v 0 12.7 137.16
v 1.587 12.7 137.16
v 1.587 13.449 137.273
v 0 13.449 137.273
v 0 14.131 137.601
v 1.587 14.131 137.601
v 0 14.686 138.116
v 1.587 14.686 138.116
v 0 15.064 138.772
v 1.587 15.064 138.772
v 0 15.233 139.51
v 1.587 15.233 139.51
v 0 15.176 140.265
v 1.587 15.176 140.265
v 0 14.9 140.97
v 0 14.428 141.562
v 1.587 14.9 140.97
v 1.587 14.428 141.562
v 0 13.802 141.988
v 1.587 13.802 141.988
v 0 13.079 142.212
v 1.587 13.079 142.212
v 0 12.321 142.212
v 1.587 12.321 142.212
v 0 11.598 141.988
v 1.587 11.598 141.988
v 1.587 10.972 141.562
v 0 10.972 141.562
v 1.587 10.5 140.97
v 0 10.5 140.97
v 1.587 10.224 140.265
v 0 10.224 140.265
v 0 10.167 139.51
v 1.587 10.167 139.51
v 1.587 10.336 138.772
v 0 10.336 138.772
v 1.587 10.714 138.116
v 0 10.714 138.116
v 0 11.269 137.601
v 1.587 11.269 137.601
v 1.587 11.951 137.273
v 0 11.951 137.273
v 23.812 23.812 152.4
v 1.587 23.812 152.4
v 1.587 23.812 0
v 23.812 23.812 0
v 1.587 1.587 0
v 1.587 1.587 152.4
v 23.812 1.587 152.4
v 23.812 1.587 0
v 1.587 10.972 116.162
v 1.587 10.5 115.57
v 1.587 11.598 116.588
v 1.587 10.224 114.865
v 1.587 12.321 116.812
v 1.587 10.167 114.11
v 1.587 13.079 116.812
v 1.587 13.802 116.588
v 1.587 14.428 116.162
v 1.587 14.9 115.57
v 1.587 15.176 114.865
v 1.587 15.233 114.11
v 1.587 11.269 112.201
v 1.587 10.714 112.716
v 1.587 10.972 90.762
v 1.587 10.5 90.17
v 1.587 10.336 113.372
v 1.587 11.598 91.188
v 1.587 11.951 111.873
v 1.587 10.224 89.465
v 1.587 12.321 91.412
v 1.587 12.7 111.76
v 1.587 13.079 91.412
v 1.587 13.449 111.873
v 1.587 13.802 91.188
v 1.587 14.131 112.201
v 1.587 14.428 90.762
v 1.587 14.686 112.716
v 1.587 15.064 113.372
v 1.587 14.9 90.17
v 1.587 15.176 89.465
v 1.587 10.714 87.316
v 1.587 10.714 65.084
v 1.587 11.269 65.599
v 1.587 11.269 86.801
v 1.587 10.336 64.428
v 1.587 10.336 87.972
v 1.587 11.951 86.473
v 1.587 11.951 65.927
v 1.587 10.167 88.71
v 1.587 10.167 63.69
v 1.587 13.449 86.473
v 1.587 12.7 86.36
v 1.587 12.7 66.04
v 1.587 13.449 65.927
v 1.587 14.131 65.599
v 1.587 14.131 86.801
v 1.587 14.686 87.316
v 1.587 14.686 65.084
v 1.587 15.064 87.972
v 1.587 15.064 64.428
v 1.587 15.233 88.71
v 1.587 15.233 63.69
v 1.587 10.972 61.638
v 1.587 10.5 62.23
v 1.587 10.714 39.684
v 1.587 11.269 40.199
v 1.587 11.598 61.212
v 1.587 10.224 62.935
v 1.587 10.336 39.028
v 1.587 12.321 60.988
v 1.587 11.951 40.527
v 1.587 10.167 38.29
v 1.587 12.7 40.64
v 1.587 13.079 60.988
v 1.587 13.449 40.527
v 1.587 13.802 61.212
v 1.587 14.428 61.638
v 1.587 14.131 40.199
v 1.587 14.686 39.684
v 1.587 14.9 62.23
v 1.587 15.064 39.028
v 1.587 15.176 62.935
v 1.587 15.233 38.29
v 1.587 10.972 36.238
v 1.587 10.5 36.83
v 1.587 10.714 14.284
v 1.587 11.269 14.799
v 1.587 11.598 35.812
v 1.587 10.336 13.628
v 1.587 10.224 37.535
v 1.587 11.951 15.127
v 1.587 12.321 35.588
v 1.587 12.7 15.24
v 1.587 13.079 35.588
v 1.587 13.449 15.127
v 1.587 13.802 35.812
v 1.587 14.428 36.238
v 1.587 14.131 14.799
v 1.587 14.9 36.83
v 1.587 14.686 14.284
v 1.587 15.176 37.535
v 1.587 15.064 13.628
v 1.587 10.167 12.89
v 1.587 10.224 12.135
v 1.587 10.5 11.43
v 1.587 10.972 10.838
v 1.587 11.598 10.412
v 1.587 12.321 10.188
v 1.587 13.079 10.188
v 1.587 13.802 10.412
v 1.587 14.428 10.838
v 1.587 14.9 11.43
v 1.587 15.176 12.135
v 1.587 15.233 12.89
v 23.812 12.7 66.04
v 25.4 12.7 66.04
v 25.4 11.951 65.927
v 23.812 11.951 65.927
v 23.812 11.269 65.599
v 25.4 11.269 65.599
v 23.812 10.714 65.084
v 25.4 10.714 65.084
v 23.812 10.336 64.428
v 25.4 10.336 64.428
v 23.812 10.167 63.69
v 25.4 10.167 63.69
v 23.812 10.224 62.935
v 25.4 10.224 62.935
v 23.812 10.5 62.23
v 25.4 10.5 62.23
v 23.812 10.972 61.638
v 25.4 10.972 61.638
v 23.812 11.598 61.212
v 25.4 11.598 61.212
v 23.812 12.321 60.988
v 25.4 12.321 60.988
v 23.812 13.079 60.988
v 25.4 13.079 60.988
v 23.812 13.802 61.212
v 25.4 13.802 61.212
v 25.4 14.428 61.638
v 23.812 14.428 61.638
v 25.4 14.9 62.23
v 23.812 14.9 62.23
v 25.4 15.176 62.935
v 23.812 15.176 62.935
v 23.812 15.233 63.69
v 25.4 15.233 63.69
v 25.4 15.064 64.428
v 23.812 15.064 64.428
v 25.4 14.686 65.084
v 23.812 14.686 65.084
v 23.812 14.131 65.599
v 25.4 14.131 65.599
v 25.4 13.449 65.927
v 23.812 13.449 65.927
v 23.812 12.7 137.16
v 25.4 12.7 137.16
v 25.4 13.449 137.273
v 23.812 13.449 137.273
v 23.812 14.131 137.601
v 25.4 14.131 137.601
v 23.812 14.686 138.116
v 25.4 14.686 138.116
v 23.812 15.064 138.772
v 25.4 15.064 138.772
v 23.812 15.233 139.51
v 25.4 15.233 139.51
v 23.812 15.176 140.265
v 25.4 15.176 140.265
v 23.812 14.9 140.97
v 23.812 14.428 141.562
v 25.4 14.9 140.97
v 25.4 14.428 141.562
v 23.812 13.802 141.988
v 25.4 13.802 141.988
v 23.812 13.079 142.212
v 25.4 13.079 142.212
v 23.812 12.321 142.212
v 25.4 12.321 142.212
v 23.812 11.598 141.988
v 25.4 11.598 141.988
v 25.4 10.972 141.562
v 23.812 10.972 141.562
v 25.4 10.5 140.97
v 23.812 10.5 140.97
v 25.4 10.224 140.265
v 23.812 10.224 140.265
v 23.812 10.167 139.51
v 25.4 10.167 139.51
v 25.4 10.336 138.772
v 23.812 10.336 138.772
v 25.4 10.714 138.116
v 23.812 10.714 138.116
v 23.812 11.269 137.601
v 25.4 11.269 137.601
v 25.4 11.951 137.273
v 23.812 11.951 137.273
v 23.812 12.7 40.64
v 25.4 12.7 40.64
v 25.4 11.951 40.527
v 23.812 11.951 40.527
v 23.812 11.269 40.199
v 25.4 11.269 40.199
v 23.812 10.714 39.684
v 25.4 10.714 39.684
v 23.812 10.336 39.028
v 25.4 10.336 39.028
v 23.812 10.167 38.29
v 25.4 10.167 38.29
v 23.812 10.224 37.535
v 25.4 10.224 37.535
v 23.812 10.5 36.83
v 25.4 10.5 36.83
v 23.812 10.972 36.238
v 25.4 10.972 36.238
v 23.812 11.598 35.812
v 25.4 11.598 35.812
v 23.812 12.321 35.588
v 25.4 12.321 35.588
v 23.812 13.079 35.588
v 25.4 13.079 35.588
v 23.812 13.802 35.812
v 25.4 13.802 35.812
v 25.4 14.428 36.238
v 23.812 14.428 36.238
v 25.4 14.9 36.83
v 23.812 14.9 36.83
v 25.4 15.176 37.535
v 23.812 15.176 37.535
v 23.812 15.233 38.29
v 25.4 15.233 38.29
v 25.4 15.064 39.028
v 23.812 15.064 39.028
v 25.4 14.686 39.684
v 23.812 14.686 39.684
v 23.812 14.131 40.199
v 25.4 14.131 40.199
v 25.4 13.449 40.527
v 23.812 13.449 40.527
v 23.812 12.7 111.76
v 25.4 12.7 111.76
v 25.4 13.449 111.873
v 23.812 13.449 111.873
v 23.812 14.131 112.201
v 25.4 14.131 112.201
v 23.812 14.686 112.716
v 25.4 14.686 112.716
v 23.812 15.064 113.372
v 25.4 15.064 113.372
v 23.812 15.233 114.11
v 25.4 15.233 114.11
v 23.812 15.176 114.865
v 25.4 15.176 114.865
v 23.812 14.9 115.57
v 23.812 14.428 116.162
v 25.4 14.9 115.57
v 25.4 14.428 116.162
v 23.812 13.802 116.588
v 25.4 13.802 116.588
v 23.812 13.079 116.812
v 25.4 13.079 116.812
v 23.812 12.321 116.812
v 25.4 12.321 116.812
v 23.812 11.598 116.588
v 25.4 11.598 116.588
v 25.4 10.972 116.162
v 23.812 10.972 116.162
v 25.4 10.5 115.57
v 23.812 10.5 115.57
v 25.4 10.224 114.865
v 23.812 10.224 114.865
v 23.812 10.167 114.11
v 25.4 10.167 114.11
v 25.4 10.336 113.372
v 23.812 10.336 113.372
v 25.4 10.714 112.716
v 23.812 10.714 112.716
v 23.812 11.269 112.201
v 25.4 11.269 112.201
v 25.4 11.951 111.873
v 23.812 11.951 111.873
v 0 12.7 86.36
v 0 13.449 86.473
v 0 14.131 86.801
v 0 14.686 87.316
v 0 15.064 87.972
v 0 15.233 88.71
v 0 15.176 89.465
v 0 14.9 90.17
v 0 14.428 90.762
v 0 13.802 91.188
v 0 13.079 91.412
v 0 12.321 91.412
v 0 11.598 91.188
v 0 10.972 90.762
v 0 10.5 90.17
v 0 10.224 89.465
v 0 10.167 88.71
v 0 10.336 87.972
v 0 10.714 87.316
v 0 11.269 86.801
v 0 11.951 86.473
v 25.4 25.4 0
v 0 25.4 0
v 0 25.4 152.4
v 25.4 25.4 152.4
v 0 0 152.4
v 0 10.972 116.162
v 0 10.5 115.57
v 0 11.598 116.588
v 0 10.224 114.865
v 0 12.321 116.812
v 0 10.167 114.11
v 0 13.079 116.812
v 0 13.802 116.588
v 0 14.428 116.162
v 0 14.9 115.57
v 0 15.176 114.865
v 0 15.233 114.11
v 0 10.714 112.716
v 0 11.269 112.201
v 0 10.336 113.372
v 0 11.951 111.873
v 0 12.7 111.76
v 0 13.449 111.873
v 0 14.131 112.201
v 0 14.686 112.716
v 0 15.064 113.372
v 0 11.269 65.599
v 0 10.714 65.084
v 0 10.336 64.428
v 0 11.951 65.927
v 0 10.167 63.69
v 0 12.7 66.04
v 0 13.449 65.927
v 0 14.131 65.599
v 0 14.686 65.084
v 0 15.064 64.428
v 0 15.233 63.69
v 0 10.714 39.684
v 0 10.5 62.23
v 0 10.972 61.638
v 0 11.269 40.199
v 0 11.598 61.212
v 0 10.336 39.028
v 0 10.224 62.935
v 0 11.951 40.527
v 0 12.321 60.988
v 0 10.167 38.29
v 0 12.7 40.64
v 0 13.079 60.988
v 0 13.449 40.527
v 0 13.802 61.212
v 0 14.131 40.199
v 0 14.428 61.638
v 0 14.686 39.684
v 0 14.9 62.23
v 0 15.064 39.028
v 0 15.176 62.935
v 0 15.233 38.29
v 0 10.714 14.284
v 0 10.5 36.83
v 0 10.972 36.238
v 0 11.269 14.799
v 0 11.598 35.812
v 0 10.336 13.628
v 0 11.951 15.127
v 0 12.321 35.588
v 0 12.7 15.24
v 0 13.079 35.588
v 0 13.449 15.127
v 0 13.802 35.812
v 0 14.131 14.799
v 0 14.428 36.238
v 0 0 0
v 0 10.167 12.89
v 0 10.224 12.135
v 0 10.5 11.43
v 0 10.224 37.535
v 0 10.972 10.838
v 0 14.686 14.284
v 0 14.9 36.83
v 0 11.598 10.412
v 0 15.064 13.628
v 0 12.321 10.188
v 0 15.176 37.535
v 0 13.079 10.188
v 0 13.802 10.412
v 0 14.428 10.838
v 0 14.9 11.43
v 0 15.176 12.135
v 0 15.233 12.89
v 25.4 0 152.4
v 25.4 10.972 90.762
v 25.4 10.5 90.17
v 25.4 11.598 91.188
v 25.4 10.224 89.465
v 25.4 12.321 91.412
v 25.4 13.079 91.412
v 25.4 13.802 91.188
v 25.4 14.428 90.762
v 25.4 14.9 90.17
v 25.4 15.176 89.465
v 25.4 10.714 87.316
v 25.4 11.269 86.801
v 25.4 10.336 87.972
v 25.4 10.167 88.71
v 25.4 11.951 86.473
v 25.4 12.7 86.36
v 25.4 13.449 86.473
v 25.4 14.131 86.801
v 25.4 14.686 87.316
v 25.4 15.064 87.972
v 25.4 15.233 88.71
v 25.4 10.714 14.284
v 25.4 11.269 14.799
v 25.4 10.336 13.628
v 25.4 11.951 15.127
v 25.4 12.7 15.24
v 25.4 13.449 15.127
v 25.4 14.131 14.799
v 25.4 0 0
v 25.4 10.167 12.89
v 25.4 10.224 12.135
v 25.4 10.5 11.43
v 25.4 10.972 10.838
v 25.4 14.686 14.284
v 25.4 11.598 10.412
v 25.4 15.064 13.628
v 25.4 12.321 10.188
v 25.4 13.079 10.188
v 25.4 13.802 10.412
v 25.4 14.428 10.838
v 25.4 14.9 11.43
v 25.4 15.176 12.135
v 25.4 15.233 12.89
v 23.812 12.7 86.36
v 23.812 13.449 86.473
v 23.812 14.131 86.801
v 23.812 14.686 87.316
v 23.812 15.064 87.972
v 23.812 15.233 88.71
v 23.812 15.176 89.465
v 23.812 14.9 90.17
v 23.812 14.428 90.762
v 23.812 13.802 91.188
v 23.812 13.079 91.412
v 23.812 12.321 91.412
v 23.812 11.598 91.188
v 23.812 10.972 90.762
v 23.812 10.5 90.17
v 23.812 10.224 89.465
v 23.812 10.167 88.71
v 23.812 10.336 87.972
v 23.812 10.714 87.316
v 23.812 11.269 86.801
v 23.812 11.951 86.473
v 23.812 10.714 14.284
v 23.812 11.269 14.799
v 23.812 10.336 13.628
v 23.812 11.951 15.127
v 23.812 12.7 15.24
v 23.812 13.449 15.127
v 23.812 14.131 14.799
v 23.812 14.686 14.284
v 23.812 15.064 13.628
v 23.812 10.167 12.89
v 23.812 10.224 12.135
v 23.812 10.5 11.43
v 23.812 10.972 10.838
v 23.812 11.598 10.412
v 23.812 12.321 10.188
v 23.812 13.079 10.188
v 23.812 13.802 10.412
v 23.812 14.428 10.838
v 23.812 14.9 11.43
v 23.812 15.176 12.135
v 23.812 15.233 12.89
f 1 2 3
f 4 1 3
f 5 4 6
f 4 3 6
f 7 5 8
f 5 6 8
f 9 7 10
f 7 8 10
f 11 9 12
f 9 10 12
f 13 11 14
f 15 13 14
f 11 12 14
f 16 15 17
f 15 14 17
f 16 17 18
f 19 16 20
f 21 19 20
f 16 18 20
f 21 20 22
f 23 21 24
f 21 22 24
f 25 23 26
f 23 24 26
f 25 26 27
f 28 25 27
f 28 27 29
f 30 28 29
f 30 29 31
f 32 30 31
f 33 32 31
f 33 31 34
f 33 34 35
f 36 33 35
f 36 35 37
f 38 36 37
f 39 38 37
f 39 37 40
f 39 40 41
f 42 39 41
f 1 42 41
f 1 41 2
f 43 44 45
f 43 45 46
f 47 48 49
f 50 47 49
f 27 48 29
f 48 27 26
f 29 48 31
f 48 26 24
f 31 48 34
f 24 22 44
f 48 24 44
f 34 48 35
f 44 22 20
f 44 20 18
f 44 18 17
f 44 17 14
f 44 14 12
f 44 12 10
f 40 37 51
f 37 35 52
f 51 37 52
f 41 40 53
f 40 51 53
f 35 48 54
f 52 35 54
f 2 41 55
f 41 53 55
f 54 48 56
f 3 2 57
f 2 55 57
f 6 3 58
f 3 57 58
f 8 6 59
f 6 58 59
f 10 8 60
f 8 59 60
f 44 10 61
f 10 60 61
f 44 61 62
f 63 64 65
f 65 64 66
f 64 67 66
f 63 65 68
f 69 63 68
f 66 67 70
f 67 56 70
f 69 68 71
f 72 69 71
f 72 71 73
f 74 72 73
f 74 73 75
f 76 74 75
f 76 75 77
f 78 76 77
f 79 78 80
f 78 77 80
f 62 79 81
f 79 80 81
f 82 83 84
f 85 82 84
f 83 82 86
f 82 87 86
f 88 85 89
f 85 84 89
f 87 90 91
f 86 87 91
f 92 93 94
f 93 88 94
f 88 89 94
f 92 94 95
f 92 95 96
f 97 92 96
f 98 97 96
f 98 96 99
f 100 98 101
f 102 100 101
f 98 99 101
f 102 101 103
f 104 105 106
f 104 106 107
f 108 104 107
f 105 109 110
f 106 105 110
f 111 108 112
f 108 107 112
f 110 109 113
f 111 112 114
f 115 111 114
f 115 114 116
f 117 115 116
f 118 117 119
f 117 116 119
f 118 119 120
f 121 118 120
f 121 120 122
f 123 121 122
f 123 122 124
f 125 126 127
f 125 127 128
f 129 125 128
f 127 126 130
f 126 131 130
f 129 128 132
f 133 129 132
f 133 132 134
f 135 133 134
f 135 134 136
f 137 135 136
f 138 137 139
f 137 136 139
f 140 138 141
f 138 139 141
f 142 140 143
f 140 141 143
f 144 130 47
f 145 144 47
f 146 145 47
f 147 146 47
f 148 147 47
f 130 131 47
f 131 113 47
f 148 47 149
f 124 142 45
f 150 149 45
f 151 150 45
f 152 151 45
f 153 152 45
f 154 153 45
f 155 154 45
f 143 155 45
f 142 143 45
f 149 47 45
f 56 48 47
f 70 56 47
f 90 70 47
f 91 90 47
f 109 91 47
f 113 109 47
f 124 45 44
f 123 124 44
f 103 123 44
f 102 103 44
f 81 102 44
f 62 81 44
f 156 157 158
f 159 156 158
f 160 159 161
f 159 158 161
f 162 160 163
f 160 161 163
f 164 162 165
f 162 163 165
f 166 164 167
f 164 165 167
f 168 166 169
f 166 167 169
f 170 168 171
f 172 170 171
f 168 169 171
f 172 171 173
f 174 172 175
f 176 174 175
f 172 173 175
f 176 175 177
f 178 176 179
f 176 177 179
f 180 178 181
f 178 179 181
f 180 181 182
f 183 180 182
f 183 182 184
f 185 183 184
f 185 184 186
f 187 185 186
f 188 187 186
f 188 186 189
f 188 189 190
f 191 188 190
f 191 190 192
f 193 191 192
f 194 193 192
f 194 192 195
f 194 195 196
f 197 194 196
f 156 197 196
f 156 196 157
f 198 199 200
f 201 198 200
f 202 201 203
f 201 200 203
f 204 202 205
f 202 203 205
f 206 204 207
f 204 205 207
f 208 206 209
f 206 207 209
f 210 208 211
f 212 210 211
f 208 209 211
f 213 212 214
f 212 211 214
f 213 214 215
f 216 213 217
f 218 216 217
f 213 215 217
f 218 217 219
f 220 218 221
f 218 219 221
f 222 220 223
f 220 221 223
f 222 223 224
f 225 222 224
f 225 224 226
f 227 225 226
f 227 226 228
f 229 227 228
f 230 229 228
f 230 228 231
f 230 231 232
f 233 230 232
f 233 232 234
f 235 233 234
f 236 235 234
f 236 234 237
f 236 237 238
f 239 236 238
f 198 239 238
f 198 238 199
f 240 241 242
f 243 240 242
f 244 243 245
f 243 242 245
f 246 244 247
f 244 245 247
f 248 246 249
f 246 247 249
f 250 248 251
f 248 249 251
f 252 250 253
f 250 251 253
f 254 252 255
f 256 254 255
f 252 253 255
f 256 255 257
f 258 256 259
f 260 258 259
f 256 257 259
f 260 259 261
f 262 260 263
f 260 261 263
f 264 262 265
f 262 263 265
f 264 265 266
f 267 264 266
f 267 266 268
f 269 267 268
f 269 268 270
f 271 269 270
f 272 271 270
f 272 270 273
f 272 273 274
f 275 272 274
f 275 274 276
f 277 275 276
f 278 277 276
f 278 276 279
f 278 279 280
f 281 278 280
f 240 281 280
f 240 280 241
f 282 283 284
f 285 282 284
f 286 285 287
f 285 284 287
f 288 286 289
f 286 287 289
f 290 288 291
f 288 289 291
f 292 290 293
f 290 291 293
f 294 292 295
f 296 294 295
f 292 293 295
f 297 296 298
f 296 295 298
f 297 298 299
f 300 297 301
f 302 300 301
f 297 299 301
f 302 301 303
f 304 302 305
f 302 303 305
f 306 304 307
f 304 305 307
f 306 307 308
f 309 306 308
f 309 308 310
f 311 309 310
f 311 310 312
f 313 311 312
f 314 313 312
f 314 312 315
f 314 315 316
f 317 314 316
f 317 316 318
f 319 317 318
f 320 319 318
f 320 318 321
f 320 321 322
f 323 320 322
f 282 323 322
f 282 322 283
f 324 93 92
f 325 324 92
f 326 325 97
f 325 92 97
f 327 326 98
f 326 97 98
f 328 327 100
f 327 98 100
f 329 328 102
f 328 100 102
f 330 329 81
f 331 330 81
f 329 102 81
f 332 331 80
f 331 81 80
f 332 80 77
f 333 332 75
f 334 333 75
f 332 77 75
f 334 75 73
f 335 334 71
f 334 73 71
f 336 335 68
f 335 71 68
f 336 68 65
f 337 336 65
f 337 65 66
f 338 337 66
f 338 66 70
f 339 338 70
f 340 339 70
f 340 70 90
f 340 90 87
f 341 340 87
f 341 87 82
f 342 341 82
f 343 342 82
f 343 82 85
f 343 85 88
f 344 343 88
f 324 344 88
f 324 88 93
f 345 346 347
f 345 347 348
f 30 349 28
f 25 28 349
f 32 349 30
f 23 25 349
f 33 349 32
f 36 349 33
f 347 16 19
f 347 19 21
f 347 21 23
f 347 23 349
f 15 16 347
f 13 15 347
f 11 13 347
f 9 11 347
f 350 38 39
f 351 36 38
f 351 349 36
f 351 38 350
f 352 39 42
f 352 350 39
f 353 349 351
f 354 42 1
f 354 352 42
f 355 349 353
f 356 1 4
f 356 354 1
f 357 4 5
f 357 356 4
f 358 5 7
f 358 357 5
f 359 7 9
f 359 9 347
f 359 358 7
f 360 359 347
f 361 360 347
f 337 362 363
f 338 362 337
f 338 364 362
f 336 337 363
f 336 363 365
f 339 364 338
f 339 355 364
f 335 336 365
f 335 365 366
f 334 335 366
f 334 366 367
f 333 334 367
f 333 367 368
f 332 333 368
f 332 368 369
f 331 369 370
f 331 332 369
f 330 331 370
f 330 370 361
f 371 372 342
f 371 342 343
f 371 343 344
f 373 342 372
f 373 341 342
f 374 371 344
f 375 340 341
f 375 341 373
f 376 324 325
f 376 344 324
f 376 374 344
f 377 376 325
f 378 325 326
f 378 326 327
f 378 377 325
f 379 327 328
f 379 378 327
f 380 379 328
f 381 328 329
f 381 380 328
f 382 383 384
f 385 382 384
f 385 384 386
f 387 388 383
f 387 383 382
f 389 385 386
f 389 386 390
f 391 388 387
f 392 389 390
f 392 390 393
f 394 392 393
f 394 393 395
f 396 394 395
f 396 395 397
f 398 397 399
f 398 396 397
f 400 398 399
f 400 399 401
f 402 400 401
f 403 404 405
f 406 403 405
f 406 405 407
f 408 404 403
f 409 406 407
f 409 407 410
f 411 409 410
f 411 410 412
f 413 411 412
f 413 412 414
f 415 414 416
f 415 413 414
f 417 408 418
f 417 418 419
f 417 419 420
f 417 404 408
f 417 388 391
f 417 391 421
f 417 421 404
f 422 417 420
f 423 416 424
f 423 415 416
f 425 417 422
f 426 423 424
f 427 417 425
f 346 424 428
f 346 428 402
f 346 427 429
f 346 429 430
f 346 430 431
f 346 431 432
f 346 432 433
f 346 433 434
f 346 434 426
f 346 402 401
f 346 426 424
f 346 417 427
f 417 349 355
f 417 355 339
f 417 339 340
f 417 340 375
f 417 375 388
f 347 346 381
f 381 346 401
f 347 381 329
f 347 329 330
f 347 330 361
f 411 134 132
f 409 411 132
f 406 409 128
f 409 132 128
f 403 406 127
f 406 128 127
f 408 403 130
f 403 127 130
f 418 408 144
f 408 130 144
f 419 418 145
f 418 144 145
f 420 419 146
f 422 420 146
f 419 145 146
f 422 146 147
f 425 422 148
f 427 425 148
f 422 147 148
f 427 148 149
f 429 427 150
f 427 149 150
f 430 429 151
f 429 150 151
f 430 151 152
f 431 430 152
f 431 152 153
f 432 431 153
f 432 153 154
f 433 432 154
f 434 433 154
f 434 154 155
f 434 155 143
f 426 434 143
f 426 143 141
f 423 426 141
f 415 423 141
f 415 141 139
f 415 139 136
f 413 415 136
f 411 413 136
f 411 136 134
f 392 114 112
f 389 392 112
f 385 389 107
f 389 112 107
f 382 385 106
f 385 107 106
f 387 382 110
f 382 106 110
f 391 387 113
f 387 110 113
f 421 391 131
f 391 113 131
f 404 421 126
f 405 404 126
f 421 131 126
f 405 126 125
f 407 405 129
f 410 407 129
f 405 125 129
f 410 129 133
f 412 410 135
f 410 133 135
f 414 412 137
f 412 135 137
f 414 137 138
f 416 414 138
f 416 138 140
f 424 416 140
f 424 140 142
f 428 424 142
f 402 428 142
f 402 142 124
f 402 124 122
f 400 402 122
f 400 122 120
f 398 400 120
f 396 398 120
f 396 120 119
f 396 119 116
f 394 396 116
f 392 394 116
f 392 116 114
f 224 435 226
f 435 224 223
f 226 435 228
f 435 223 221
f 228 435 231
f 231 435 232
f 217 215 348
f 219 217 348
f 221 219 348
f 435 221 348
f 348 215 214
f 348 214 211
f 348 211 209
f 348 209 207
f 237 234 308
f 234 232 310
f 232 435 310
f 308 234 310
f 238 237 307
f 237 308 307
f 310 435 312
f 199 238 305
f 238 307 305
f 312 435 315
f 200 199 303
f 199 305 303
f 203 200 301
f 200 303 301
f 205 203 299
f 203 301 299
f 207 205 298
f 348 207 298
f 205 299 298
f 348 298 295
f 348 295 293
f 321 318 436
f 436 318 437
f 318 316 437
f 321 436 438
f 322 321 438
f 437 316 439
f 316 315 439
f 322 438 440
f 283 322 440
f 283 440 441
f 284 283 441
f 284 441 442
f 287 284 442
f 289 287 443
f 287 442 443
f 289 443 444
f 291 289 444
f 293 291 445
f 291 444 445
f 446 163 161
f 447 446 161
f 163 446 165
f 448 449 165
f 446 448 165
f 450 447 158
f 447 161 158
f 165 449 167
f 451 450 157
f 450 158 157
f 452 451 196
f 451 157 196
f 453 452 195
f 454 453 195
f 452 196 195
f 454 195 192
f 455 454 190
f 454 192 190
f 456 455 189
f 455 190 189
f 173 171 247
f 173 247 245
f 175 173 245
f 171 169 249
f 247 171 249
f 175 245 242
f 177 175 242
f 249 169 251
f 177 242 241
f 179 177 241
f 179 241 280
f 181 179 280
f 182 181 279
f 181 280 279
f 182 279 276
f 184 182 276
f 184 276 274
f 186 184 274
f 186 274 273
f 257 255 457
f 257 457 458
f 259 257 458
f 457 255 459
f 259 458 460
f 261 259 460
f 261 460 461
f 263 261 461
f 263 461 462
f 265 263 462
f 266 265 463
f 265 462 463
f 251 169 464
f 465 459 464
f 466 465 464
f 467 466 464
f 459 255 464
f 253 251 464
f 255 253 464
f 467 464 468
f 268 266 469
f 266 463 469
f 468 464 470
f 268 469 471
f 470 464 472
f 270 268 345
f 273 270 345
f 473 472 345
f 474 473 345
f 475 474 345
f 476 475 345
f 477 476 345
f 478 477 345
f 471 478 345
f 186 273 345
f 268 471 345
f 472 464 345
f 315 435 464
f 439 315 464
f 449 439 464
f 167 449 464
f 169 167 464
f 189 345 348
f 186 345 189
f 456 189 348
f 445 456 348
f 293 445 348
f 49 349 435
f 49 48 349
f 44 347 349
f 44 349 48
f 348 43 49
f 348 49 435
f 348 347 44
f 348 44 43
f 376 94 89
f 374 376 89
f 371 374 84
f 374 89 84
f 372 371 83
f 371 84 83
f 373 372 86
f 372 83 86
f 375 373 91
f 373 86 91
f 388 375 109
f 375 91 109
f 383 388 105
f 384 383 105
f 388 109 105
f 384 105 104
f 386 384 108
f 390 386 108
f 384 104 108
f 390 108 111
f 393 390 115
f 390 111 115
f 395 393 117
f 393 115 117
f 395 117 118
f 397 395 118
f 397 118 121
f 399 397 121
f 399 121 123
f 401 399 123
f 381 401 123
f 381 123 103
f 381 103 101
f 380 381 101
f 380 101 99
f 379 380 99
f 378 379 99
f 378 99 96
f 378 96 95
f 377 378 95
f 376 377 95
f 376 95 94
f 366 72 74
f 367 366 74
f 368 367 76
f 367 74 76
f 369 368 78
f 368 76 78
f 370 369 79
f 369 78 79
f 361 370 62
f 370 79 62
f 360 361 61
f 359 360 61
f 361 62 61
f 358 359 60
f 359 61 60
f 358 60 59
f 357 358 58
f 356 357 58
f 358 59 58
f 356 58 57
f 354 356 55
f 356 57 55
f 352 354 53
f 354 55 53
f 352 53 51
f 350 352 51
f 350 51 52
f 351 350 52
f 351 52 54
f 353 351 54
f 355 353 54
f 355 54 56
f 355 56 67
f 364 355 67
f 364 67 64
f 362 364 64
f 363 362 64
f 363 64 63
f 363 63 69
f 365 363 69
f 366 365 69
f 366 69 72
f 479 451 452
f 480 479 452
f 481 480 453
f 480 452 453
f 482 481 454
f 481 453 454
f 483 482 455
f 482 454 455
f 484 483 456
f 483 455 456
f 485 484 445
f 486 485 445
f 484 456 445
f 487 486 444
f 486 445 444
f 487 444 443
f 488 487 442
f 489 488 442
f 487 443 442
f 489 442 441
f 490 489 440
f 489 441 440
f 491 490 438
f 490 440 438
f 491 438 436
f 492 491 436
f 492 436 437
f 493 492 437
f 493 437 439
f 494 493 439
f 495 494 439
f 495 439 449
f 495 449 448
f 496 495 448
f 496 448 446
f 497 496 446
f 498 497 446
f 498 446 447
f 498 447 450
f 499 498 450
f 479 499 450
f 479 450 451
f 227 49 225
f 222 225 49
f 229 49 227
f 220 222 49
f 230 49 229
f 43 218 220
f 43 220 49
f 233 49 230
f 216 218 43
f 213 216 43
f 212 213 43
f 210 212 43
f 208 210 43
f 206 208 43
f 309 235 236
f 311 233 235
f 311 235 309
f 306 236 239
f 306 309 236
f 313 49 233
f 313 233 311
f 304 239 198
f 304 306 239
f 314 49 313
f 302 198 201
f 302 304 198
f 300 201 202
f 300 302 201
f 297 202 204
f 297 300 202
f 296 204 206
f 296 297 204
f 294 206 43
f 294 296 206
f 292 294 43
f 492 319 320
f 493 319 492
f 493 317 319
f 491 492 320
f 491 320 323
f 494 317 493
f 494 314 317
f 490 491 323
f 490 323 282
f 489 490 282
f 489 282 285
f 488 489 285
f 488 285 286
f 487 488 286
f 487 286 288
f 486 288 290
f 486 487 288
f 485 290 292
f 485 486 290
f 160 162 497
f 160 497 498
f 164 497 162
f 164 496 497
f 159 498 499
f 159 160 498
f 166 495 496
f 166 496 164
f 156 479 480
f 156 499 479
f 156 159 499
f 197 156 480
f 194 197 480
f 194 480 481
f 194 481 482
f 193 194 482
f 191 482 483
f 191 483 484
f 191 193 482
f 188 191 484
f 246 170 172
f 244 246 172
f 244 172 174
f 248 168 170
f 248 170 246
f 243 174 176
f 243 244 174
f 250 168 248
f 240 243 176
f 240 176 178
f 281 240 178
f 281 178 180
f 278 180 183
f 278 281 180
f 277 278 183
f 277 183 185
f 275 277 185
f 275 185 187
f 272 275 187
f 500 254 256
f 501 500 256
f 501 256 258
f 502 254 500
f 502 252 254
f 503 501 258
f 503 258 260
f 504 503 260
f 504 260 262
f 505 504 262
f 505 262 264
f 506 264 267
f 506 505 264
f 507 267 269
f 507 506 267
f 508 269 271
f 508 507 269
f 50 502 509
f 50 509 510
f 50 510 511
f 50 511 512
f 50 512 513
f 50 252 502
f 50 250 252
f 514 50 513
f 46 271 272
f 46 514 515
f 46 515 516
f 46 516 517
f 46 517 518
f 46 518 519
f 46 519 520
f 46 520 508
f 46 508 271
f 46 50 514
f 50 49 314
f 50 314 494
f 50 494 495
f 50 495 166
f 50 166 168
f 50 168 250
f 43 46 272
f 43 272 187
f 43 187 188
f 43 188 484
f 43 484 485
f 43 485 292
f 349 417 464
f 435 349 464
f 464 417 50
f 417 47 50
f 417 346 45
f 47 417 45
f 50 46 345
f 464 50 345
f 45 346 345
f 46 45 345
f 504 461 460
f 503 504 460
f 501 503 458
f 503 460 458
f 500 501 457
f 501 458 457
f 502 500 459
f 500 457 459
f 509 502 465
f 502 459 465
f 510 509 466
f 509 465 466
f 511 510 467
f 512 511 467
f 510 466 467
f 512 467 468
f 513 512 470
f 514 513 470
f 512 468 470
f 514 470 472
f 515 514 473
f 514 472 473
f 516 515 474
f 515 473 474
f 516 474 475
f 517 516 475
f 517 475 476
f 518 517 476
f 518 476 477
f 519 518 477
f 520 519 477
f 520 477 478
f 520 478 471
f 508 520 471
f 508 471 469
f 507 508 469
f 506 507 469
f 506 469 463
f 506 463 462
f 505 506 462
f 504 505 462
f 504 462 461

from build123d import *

# Parameters (mm, degrees)
SKETCH1_W           = 25.4
SKETCH1_H           = 25.4
SKETCH1_W_2         = 22.225
SKETCH1_H_2         = 22.225
BOSS_EXTRUDE1_DEPTH = 152.4
SKETCH4_R           = 2.54
CUT_EXTRUDE3_DEPTH  = 157.576115675


with BuildPart() as part:
    # Sketch1 → Boss-Extrude1 (new body)
    with BuildSketch(Plane.XY):
        with Locations((12.7, 12.7)):
            Rectangle(SKETCH1_W, SKETCH1_H)
        with Locations((12.7, 12.7)):
            Rectangle(SKETCH1_W_2, SKETCH1_H_2, mode=Mode.SUBTRACT)
    extrude(amount=BOSS_EXTRUDE1_DEPTH)

    # Sketch4 → Cut-Extrude3 (cut, through all)
    with BuildSketch(Plane(origin=(25.4, 0, 0), x_dir=(0, 0, -1), z_dir=(1, 0, 0))):
        with Locations((-139.7, 12.7)):
            Circle(SKETCH4_R)
        with Locations((-114.3, 12.7)):
            Circle(SKETCH4_R)
        with Locations((-88.9, 12.7)):
            Circle(SKETCH4_R)
        with Locations(Location((-63.5, 12.7, 0), (0, 0, 180))):
            Circle(SKETCH4_R)
        with Locations(Location((-38.1, 12.7, 0), (0, 0, 180))):
            Circle(SKETCH4_R)
        with Locations(Location((-12.7, 12.7, 0), (0, 0, 180))):
            Circle(SKETCH4_R)
    extrude(amount=-CUT_EXTRUDE3_DEPTH, mode=Mode.SUBTRACT)


solid = part.part
